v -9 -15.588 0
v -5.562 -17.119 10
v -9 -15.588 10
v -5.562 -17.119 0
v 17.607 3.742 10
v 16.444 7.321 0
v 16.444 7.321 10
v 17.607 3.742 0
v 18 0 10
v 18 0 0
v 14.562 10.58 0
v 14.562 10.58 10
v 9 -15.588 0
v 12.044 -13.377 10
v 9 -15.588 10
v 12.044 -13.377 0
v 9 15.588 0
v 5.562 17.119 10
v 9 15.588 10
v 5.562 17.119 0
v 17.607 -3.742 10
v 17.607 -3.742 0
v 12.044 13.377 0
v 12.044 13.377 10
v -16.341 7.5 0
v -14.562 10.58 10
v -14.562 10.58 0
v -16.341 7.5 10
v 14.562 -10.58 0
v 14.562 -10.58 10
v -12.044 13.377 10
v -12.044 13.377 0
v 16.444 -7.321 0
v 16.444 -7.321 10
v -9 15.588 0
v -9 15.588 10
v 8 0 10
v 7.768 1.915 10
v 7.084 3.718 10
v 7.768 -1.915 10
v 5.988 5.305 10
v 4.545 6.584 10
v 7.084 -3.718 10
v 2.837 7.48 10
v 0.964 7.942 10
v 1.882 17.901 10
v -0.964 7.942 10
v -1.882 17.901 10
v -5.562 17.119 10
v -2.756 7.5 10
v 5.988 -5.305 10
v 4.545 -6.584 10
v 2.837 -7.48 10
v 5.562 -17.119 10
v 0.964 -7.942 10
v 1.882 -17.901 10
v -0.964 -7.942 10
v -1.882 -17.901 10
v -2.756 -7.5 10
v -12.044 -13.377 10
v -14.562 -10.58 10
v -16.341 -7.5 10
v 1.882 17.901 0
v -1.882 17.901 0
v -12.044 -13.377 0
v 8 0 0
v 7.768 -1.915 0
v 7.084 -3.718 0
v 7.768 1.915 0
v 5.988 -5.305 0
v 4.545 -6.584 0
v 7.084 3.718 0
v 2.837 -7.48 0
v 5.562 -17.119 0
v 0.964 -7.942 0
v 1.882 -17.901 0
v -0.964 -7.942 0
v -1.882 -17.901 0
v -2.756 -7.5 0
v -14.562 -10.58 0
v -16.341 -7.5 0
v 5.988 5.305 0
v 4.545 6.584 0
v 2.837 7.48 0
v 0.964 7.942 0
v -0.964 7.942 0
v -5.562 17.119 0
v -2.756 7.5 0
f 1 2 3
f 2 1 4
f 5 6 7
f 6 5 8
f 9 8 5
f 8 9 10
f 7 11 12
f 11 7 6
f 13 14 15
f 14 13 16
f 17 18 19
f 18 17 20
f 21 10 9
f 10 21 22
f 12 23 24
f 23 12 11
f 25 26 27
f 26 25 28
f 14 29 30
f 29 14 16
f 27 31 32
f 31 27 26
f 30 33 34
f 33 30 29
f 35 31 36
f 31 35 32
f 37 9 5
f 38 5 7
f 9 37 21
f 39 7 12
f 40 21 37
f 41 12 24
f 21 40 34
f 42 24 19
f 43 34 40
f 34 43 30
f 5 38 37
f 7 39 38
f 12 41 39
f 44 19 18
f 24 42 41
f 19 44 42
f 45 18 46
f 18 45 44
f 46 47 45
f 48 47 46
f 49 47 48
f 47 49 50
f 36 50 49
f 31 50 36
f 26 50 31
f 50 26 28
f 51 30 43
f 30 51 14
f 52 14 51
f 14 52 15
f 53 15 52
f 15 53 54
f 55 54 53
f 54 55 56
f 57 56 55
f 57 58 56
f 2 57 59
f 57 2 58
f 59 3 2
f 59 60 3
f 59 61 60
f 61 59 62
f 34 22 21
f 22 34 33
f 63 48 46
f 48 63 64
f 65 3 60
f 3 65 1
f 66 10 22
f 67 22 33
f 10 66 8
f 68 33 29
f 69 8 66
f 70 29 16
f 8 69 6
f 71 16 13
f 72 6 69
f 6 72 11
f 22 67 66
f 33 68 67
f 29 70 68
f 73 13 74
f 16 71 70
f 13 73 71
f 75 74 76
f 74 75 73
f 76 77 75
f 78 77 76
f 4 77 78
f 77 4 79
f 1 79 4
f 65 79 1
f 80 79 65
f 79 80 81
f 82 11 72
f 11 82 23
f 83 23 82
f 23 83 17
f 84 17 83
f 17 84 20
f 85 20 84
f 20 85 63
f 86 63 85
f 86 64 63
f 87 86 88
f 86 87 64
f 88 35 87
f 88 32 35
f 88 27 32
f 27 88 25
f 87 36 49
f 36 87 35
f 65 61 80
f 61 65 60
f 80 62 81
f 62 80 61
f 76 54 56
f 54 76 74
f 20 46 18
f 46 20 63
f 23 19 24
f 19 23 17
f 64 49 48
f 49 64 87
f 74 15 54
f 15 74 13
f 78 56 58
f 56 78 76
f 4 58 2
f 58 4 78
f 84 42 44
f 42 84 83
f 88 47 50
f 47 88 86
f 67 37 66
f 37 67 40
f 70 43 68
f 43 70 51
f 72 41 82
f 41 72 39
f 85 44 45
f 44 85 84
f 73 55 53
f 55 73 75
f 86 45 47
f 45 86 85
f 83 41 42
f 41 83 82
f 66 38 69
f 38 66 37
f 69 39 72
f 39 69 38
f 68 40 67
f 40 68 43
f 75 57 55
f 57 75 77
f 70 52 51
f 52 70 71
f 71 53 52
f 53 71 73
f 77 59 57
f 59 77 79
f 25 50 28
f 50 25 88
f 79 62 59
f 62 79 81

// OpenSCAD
// [FL_INDEX: keywords="openscad, 3d_parametric, Push_fit_plumbing_connector_removal_tool_parametric___customizable, csg_solid" | COT="Parametric OpenSCAD design from 3DCodeverse"]
// Title: Push fit plumbing connector removal tool parametric / customizable

// Diameter of pipe [mm] *default of 16 fits 1/2"
innerDiameter=16;

// Outer diameter of tool [mm]
outerDiameter=36;

// Thickness of tool [mm]
thickness=10;

difference() {
	cylinder(h=thickness,r=outerDiameter/2);
	translate([0,0,-0.5])
	cylinder(h=thickness+1,r=innerDiameter/2);
	translate([-outerDiameter,-((innerDiameter-1)/2),-0.5])
	cube([outerDiameter,innerDiameter-1,thickness+1]);
}
